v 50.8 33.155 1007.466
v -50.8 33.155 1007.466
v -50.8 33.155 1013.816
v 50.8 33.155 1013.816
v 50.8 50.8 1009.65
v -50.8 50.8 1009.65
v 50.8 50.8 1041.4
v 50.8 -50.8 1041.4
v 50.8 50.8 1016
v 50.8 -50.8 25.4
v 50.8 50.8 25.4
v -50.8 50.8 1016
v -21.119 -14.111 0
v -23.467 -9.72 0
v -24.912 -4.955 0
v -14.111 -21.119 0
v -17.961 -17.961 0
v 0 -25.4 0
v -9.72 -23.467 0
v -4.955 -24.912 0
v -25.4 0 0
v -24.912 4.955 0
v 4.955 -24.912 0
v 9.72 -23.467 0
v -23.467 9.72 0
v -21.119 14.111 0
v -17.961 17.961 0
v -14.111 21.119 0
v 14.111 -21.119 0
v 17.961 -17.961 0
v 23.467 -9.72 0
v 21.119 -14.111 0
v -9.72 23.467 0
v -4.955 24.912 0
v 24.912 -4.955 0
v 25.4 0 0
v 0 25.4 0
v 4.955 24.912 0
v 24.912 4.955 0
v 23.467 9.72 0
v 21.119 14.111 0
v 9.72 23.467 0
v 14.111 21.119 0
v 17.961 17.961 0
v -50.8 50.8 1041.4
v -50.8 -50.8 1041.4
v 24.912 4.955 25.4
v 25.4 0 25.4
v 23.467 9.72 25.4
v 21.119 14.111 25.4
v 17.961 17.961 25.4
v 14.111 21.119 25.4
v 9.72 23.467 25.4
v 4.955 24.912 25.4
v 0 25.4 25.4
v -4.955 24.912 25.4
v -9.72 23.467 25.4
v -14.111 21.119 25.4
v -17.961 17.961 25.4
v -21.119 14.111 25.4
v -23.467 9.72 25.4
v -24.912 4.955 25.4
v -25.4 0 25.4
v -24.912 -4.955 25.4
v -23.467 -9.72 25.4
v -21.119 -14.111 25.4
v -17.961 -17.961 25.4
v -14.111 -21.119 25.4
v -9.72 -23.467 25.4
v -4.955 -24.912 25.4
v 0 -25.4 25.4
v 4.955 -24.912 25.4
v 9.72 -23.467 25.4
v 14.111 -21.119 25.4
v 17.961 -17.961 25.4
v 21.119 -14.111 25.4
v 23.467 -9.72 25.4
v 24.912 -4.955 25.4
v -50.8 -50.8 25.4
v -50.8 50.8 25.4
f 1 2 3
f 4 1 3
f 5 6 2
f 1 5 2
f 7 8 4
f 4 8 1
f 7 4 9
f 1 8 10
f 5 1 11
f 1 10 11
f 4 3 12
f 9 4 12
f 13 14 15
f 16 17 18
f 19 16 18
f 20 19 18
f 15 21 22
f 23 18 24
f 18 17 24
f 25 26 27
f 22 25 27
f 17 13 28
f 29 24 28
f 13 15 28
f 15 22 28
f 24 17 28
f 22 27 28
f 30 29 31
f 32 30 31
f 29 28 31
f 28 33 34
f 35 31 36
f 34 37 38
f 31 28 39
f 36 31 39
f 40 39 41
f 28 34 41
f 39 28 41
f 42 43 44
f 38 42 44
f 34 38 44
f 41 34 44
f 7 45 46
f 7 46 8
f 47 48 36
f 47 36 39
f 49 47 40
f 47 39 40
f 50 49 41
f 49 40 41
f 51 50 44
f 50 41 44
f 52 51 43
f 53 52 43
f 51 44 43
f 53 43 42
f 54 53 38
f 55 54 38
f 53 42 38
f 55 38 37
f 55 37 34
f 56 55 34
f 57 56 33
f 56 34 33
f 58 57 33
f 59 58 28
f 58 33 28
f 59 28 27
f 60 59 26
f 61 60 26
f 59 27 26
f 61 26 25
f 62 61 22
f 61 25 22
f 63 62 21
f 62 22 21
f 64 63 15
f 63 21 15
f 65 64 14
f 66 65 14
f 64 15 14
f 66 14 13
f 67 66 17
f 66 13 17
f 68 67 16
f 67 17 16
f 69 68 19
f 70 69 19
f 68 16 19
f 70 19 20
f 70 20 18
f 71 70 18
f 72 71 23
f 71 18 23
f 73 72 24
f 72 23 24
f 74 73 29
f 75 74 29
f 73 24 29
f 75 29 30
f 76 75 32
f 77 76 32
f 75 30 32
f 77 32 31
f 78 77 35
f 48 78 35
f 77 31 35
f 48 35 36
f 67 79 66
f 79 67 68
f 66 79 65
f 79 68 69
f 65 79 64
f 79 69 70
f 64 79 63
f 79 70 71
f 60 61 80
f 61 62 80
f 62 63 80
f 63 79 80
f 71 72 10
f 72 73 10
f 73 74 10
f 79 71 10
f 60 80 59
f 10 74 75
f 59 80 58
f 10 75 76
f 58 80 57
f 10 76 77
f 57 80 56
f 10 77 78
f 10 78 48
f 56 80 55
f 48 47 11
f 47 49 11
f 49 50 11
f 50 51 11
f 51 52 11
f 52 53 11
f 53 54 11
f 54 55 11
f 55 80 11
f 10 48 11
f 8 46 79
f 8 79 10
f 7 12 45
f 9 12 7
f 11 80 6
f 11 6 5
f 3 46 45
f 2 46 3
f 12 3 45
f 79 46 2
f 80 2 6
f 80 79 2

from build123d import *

# Parameters (mm, degrees)
F0_R     = 25.4
F1_DEPTH = 25.4
F2_W     = 101.6
F2_H     = 101.6
F3_DEPTH = 1016
F5_DEPTH = 101.6


with BuildPart() as f1:
    # F0 (on Top) → F1 (new body)
    with BuildSketch(Plane.XY):
        Circle(F0_R)
    extrude(amount=F1_DEPTH)

    # F2 (on face) → F3 (join)
    with BuildSketch(Plane.XY.offset(25.4)):
        Rectangle(F2_W, F2_H)
    extrude(amount=F3_DEPTH)

    # F4 (on face) → F5 (cut)
    with BuildSketch(Plane(origin=(-50.8, 0, 0), x_dir=(0, -1, 0), z_dir=(-1, 0, 0))):
        Polygon((-33.154695, 1013.8156), (-50.8, 1016), (-50.8, 1009.65), (-33.154695, 1007.4656), align=None)
    extrude(amount=-F5_DEPTH, mode=Mode.SUBTRACT)


solid = f1.part
